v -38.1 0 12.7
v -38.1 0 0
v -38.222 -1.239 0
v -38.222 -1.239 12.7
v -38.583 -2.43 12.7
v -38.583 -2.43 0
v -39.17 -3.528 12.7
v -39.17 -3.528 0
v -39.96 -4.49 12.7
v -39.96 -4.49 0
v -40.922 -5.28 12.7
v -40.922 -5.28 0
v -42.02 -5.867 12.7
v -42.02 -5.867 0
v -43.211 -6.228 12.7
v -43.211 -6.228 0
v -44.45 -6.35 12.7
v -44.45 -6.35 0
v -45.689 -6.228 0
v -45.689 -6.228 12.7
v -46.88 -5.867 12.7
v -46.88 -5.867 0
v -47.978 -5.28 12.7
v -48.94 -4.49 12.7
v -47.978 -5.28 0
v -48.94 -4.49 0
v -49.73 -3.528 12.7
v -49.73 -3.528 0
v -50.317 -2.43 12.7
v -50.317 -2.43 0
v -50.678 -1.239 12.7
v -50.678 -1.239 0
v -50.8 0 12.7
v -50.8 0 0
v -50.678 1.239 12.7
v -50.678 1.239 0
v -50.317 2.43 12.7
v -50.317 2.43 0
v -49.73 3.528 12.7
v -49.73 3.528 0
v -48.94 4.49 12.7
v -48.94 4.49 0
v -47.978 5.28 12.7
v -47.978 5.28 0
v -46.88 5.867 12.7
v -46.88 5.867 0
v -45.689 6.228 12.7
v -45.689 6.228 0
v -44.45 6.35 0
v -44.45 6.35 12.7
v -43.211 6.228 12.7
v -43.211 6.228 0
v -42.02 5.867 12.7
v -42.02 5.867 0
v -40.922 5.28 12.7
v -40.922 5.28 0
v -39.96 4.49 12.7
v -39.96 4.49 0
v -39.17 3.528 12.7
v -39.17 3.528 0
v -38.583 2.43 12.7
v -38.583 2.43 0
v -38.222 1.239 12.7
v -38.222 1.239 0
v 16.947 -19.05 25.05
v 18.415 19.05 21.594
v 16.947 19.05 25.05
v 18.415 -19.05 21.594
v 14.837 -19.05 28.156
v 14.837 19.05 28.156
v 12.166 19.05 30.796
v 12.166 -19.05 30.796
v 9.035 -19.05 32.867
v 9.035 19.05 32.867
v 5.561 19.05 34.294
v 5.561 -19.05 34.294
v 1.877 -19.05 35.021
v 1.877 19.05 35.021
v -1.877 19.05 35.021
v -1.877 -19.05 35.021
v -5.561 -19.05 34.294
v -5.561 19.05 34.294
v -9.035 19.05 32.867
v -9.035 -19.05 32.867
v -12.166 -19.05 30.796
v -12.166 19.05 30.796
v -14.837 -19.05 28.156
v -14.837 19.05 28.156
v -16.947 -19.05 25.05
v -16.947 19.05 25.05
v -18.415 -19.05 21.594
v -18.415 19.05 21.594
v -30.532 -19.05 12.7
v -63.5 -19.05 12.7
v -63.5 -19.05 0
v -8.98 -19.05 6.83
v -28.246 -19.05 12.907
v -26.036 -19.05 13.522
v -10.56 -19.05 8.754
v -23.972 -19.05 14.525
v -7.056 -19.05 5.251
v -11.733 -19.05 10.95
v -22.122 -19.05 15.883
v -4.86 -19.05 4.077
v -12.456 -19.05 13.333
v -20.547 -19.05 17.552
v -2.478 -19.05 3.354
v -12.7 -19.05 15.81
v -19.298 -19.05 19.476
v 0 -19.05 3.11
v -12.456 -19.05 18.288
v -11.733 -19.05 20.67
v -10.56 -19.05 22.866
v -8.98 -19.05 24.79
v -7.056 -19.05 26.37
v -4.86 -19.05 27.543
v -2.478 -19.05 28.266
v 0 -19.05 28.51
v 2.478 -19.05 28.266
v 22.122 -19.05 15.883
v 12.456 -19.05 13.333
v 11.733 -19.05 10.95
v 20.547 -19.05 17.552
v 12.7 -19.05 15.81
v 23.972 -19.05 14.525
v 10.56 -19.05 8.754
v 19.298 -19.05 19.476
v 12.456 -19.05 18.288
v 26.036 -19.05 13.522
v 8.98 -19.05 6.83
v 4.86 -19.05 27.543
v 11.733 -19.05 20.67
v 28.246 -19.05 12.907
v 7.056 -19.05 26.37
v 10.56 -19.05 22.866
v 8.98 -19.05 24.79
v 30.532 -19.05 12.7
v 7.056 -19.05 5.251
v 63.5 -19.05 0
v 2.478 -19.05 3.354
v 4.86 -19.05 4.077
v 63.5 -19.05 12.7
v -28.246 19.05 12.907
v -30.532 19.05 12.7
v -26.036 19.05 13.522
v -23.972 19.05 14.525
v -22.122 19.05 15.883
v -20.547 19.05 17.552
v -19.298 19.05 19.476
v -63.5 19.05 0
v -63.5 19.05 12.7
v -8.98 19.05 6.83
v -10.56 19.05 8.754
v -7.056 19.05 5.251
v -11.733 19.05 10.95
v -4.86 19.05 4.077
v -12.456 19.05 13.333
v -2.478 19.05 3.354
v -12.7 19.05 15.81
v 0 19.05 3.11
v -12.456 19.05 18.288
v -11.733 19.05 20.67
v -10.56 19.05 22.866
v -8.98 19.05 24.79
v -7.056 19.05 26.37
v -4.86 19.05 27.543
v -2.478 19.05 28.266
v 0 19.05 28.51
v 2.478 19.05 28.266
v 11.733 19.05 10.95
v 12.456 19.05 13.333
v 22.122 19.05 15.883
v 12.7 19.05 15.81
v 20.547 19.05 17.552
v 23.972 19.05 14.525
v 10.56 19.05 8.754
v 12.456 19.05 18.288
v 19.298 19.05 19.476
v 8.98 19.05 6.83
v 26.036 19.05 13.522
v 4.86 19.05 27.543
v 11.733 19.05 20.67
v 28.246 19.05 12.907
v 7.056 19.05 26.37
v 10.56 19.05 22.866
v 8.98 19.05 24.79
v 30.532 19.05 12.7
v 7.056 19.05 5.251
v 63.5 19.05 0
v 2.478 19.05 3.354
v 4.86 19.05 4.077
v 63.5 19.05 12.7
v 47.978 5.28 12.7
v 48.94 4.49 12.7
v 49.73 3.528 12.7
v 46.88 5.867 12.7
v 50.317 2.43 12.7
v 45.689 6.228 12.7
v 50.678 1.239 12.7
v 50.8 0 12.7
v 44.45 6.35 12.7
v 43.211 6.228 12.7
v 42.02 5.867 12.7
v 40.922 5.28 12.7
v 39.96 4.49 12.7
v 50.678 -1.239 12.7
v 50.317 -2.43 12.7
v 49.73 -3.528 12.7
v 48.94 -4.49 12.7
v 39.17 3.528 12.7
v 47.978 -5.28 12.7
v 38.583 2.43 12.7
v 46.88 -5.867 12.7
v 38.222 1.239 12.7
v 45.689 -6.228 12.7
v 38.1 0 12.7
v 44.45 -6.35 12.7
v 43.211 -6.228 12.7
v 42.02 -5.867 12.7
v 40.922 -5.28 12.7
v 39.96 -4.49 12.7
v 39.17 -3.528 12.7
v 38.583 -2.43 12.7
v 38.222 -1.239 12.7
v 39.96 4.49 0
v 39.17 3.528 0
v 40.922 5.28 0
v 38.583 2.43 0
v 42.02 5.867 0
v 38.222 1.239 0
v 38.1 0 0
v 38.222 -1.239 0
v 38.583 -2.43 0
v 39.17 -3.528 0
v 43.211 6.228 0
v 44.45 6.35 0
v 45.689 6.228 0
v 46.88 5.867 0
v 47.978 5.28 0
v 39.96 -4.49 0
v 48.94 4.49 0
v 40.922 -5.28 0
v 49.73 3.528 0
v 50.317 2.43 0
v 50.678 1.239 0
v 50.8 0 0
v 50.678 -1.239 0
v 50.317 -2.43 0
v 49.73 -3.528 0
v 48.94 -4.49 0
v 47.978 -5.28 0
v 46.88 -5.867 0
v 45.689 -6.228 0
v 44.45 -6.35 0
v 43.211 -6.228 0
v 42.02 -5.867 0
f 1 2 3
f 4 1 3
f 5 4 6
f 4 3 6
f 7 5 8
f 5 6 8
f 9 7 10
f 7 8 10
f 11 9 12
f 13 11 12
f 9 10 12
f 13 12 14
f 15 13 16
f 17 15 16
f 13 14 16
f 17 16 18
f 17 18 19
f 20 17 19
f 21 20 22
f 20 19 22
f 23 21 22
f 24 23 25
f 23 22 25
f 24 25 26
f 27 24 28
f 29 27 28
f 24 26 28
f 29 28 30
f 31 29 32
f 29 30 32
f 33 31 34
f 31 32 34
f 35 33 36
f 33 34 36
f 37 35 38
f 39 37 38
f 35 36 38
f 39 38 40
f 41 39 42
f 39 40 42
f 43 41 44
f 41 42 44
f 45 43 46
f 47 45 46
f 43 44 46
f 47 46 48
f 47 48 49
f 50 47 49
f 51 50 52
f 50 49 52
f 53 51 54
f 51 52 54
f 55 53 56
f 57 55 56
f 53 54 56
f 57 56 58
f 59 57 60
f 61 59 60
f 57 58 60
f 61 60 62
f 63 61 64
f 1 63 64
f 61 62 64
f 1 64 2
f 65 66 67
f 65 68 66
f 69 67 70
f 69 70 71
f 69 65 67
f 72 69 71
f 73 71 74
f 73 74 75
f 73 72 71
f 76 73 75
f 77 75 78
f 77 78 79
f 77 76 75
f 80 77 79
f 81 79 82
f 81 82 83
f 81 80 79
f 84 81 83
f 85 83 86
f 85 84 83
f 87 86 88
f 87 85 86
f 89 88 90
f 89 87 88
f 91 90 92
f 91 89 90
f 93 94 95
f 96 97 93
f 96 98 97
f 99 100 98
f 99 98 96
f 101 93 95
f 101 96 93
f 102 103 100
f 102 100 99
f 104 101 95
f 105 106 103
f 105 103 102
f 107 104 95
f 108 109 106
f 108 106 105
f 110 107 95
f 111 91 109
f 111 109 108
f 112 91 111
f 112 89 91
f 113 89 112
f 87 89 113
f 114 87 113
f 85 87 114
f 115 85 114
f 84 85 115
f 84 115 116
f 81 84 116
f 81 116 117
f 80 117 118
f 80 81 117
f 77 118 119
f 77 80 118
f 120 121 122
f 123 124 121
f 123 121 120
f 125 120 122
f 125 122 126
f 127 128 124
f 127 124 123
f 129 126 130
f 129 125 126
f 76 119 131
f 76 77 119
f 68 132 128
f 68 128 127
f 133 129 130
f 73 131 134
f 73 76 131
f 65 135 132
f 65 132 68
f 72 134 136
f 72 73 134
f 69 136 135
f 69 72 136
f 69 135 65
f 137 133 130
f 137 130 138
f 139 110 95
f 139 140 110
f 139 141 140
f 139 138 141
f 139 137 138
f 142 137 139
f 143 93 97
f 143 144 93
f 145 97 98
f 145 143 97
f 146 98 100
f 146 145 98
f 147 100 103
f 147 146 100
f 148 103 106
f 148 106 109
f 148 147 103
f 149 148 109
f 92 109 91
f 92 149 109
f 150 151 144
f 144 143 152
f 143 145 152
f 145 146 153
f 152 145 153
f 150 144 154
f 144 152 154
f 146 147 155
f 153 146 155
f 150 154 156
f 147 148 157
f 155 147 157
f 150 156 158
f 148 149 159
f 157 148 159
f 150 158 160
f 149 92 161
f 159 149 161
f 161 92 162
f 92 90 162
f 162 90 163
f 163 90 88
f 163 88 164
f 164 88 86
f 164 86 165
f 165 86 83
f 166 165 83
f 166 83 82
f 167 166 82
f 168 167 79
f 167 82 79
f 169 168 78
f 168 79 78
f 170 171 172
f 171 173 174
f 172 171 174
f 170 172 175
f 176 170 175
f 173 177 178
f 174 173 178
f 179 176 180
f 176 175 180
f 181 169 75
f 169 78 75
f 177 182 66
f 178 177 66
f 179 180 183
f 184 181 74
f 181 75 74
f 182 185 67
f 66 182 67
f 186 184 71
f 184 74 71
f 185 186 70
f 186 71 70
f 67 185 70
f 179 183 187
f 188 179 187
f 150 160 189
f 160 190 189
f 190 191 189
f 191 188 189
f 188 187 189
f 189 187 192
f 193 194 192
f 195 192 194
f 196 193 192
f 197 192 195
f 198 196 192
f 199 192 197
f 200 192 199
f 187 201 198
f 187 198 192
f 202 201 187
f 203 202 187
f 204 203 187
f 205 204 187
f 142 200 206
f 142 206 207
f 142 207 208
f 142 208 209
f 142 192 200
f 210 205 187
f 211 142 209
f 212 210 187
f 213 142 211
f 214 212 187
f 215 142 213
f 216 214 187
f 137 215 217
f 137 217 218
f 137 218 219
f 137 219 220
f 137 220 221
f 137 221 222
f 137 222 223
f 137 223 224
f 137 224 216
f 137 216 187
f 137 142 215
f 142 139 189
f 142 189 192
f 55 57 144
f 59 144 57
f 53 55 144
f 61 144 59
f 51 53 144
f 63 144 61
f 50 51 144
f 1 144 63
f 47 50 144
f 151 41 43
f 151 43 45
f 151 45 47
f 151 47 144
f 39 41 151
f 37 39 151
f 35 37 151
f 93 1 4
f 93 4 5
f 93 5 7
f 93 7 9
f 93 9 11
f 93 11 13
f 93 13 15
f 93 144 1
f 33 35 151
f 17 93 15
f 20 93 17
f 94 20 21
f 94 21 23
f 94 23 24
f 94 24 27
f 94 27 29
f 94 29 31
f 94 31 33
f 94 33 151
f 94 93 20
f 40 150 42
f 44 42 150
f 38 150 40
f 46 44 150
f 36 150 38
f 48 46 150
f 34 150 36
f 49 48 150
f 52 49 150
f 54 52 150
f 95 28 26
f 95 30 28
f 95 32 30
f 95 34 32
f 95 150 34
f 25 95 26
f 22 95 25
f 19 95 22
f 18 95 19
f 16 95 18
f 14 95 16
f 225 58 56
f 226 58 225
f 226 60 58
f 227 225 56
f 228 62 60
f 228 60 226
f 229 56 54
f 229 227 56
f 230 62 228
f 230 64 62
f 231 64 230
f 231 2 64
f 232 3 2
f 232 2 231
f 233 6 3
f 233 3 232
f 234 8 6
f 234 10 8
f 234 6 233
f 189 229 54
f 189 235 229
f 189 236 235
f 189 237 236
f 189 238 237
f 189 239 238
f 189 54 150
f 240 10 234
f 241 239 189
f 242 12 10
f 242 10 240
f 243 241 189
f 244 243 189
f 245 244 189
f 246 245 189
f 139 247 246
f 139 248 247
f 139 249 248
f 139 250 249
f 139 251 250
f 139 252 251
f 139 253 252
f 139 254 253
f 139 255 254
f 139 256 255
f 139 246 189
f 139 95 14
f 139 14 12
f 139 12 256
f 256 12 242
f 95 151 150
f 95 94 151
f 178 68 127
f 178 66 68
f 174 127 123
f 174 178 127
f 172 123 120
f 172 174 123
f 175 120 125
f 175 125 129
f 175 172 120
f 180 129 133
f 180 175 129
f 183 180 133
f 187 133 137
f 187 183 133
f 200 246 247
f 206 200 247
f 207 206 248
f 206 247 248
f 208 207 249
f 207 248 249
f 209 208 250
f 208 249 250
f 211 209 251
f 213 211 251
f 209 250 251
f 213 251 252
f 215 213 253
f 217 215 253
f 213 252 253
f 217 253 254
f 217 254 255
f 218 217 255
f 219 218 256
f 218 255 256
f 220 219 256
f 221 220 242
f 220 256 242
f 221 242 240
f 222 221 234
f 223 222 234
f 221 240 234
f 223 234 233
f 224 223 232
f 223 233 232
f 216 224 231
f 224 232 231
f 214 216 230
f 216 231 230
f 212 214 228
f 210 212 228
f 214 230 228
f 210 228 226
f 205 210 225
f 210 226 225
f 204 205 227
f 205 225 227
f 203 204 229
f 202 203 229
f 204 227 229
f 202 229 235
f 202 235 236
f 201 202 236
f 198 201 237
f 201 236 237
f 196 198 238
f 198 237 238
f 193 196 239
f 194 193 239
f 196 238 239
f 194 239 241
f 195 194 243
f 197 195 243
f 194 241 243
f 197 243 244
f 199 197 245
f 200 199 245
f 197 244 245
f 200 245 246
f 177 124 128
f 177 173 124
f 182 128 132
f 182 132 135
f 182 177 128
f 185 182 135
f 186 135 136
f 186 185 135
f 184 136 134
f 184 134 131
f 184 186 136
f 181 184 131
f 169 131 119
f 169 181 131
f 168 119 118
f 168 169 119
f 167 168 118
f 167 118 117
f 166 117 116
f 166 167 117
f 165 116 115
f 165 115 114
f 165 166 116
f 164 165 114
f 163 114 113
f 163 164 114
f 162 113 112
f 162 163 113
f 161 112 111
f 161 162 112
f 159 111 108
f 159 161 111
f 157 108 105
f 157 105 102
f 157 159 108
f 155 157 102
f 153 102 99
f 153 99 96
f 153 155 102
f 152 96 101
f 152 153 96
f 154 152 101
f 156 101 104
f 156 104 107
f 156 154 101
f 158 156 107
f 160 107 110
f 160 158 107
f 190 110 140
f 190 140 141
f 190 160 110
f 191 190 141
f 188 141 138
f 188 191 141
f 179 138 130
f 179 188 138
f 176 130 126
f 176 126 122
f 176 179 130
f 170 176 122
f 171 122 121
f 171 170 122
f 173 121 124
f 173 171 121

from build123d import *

# Parameters (mm, degrees)
F0_R     = 12.7
F1_DEPTH = 19.05
F2_R     = 12.7
F3_R     = 6.35
F5_DEPTH = 12.7


# Not quite as in the source:
# - the program builds the solid bodies; features that only make, move or delete a surface that nothing else refers to are left out


with BuildPart() as f1:
    # F0 (on Front) → F1 (new body, symmetric)
    with BuildSketch(Plane.XZ):
        with BuildLine():
            Line((-63.5, 12.7), (-63.5, 0))
            Line((-63.5, 0), (63.5, 0))
            Line((63.5, 0), (63.5, 12.7))
            Line((63.5, 12.7), (19.05, 12.7))
            ThreePointArc((19.05, 12.7), (0, 35.1124285501), (-19.05, 12.7))
            Line((-19.05, 12.7), (-63.5, 12.7))
        make_face()
        with Locations((0, 15.8102040816)):
            Circle(F0_R, mode=Mode.SUBTRACT)
    extrude(amount=F1_DEPTH, both=True)

    # F2
    f2_edges = [f1.edges().sort_by_distance(p)[0] for p in [
        (-19.05, 0, 12.7),
        (19.05, 0, 12.7),
    ]]
    fillet(f2_edges, radius=F2_R)

    # F3 (on face) → F5 (cut, through all)
    with BuildSketch(Plane(origin=(0, 0, 0), x_dir=(1, 0, 0), z_dir=(0, 0, -1))):
        with Locations((-44.45, 0)):
            Circle(F3_R)
        with Locations((44.45, 0)):
            Circle(F3_R)
    extrude(amount=-F5_DEPTH, mode=Mode.SUBTRACT)


solid = f1.part
